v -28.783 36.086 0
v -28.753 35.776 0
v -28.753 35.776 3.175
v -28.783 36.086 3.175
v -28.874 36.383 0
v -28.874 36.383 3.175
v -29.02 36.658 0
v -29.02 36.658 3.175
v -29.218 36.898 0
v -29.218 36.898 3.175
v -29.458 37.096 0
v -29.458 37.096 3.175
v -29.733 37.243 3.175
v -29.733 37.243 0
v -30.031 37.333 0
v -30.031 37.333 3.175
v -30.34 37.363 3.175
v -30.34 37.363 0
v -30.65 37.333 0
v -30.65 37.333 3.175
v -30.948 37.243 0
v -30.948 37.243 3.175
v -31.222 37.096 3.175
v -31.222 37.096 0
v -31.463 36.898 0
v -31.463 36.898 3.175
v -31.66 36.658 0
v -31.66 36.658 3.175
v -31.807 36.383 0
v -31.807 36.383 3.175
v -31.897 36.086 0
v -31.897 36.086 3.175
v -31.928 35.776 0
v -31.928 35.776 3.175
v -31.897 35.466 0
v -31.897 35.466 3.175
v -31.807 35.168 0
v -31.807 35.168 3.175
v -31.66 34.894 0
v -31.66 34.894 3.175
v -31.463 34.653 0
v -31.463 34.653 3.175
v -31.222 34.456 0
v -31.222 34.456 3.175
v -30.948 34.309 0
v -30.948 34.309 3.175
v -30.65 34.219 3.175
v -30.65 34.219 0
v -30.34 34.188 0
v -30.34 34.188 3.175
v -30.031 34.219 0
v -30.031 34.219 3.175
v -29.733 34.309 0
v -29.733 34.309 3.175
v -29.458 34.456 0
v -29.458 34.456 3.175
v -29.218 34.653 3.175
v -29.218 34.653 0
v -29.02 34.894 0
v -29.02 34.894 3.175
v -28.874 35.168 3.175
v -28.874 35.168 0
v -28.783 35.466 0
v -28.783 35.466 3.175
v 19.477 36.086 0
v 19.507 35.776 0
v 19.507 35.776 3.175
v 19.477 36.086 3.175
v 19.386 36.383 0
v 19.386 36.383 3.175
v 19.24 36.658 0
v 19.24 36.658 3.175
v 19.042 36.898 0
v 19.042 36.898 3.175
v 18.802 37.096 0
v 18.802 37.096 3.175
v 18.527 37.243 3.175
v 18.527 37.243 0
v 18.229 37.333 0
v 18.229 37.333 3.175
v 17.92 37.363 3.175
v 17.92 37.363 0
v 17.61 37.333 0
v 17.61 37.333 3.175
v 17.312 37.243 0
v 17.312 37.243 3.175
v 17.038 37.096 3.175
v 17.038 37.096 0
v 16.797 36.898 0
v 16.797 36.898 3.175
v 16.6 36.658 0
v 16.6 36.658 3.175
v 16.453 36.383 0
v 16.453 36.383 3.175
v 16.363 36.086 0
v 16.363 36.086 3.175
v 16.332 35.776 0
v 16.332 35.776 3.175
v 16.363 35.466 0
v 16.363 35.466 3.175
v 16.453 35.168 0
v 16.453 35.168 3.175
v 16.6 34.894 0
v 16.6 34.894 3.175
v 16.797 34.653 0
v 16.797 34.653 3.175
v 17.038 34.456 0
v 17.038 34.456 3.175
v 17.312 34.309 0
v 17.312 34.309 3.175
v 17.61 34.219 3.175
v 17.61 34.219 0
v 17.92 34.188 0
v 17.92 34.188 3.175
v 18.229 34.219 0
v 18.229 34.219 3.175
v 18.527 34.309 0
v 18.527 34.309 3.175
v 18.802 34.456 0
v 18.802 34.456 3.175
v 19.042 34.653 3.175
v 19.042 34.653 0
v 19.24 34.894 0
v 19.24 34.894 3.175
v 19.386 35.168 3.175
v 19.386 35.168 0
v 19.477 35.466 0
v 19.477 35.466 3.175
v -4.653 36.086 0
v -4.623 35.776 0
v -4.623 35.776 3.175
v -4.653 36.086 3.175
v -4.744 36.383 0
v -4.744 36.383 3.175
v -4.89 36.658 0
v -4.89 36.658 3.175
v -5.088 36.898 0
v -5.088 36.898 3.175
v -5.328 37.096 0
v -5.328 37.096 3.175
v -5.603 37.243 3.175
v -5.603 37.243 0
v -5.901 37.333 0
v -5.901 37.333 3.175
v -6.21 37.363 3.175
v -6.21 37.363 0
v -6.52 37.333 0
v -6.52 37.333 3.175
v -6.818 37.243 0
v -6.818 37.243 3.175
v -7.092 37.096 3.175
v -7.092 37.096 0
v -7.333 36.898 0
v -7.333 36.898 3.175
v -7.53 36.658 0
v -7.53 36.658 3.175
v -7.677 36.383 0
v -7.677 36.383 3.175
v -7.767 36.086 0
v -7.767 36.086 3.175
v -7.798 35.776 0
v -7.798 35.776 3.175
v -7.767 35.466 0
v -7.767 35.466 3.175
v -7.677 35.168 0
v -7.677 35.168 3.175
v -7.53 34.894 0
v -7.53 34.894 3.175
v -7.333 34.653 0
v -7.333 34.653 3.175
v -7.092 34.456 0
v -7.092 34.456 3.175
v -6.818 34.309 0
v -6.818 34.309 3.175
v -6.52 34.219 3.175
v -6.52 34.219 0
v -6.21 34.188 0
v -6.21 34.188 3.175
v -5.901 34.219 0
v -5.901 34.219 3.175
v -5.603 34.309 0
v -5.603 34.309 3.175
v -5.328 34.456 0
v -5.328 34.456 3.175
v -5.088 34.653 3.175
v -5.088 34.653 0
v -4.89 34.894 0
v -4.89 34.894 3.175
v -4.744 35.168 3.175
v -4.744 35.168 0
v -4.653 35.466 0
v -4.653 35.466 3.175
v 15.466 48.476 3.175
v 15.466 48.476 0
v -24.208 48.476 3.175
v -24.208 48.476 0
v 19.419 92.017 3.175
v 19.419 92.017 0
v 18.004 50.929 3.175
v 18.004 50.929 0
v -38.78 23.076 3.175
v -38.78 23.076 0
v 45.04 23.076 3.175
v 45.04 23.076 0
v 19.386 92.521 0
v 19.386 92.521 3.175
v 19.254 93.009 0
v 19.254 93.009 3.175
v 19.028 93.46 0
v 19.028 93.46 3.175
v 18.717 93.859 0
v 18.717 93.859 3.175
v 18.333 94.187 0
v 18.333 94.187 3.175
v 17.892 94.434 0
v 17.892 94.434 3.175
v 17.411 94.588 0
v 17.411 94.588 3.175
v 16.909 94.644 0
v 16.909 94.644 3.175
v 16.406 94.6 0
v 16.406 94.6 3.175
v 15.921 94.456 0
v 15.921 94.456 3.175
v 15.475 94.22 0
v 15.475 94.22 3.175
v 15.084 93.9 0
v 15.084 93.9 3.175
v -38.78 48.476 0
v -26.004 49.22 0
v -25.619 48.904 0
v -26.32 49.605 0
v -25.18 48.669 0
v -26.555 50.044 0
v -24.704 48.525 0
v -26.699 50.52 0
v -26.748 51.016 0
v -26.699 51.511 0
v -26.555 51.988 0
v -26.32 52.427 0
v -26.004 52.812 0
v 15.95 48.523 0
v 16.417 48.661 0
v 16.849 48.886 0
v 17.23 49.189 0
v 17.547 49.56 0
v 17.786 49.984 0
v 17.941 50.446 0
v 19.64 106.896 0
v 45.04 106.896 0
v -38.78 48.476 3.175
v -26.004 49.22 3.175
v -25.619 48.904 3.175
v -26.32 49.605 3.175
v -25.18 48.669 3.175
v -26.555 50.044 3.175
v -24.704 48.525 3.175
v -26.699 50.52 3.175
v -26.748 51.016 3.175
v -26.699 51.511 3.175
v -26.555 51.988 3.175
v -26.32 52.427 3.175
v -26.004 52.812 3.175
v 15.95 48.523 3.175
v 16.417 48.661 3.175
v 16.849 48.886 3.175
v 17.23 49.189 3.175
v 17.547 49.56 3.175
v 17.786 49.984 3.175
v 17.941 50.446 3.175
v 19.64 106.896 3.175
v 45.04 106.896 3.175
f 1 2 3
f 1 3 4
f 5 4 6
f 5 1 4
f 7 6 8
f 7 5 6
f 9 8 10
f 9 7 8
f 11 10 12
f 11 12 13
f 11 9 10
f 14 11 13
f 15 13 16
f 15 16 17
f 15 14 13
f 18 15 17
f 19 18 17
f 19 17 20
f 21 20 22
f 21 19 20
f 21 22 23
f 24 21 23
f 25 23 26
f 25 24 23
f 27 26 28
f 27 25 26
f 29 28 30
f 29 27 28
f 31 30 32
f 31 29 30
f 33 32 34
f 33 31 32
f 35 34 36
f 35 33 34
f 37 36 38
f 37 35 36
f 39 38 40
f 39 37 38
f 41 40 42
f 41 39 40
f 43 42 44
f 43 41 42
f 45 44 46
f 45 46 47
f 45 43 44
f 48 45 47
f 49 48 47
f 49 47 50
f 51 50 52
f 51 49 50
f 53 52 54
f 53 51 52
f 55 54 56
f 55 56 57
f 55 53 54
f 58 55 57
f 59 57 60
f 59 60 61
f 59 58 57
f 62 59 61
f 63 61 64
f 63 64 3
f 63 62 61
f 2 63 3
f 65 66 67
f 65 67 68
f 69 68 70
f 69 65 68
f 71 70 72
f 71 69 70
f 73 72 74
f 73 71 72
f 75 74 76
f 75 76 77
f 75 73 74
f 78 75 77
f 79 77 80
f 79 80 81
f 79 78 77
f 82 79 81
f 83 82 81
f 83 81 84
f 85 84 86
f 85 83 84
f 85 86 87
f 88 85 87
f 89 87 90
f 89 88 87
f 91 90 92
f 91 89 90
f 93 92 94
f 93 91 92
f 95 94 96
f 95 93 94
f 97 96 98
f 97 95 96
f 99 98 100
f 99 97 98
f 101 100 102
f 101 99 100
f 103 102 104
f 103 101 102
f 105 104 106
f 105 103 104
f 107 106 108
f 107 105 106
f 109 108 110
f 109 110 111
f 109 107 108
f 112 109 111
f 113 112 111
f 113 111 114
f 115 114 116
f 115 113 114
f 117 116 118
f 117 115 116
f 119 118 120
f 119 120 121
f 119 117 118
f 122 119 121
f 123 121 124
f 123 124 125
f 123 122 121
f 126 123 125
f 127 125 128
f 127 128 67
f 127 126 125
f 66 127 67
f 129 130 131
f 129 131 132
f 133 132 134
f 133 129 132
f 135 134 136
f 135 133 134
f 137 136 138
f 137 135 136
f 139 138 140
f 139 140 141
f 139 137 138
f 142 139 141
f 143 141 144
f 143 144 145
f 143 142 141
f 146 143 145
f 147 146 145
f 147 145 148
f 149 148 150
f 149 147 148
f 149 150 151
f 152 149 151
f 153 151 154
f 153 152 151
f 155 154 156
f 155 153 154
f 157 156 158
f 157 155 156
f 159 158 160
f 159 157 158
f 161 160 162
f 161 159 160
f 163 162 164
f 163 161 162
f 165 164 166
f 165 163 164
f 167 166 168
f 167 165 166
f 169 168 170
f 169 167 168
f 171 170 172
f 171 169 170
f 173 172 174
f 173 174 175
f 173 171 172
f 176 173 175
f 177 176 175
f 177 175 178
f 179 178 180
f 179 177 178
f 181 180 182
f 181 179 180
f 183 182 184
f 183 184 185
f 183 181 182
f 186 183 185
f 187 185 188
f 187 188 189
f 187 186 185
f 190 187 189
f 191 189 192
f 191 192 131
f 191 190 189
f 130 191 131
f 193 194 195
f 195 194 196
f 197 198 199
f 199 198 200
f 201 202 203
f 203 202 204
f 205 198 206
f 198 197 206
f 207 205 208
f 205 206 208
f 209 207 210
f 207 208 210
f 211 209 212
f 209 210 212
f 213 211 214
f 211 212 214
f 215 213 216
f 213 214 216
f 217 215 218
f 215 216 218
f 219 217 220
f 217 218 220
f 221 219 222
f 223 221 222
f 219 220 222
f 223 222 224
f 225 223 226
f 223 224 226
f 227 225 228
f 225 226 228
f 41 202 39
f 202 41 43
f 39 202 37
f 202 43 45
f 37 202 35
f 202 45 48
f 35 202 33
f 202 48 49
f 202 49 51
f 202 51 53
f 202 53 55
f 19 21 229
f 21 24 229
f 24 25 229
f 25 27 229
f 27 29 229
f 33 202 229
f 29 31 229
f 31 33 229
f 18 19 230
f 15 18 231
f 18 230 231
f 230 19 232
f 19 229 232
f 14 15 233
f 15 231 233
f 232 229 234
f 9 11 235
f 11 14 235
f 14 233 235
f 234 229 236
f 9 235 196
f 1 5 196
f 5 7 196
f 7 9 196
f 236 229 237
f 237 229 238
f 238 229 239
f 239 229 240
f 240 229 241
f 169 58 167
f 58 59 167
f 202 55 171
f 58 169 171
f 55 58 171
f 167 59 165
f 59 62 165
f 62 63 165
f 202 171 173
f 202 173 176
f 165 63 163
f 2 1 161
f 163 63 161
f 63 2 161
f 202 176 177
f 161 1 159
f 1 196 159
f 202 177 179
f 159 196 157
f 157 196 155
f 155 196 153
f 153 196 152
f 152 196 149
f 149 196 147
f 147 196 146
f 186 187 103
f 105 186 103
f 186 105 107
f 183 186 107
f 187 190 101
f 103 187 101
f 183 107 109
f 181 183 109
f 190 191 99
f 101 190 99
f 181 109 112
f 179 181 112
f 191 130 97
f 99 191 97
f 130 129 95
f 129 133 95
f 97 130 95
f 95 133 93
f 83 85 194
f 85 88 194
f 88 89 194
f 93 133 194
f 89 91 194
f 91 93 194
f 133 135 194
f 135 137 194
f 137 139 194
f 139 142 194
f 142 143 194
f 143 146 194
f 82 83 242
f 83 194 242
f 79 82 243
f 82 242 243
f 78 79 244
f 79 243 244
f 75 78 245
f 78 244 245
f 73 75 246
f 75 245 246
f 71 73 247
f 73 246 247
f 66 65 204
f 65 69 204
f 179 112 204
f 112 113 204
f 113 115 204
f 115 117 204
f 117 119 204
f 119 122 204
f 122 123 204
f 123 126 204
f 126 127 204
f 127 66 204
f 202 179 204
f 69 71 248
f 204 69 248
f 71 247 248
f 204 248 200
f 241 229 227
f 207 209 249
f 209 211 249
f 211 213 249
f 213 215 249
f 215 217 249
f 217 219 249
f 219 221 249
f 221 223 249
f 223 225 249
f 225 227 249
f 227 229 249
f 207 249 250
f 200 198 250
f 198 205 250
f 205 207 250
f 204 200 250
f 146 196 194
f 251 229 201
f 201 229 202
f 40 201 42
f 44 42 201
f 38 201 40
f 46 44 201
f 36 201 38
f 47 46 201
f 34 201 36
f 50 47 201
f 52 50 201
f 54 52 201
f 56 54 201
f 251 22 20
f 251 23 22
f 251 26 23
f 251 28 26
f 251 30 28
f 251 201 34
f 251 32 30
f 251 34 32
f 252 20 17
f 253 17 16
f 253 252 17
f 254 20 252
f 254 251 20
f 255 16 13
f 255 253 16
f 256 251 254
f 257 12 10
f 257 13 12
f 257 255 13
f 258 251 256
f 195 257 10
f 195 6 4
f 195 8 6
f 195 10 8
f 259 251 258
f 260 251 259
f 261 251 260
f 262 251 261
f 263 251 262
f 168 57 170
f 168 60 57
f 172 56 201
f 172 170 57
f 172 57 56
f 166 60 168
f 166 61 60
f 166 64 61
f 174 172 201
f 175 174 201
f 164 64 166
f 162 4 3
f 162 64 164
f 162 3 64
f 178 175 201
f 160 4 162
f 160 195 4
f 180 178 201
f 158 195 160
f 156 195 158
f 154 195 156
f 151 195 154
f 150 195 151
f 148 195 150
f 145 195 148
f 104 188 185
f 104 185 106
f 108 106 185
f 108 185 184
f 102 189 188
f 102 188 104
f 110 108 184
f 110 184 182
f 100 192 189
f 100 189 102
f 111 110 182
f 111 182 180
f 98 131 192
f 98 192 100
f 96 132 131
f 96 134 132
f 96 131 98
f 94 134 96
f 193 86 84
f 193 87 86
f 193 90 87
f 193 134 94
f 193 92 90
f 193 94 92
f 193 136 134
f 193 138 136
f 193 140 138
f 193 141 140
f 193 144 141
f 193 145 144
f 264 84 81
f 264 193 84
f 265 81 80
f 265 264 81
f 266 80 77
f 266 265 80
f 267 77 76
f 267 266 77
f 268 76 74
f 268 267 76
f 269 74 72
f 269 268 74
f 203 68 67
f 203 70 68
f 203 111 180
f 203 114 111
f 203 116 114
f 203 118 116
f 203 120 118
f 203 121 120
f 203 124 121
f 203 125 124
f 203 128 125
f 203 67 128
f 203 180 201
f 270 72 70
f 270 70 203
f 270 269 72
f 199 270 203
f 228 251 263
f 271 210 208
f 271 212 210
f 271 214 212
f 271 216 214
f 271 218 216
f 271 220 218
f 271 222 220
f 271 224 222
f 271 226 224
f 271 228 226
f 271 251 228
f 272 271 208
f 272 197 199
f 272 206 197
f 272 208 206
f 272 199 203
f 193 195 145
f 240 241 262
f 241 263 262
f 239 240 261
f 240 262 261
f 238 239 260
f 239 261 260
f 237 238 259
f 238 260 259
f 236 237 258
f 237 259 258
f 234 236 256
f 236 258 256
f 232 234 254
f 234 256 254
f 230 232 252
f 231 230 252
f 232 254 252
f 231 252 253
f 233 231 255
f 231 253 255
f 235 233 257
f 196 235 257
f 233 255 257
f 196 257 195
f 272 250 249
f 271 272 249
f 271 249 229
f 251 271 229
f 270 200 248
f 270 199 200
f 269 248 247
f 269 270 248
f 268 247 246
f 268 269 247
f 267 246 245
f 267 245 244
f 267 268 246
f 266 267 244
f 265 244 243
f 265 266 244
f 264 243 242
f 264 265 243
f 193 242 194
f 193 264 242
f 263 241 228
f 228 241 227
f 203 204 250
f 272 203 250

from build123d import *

# Parameters (mm, degrees)
F0_R     = 1.5875
F1_DEPTH = 3.175
F2_R     = 2.54


with BuildPart() as f1:
    # F0 (on Top) → F1 (new body)
    with BuildSketch(Plane.XY):
        Polygon((19.640194, 106.89594), (-38.779806, 48.47594), (-38.779806, 23.07594), (45.040194, 23.07594), (45.040194, 106.89594), align=None)
        with Locations((-30.340388, 35.77594)):
            Circle(F0_R, mode=Mode.SUBTRACT)
        with Locations((-6.210388, 35.77594)):
            Circle(F0_R, mode=Mode.SUBTRACT)
        with Locations((17.919612, 35.77594)):
            Circle(F0_R, mode=Mode.SUBTRACT)
        Polygon((17.919612, 48.47594), (-30.340388, 48.47594), (19.640194, 98.456522), align=None, mode=Mode.SUBTRACT)
    extrude(amount=F1_DEPTH)

    # F2
    f2_edges = [f1.edges().sort_by_distance(p)[0] for p in [
        (-30.340388, 48.47594, 1.5875),
        (17.919612, 48.47594, 1.5875),
        (19.640194, 98.456522, 1.5875),
    ]]
    fillet(f2_edges, radius=F2_R)


solid = f1.part
